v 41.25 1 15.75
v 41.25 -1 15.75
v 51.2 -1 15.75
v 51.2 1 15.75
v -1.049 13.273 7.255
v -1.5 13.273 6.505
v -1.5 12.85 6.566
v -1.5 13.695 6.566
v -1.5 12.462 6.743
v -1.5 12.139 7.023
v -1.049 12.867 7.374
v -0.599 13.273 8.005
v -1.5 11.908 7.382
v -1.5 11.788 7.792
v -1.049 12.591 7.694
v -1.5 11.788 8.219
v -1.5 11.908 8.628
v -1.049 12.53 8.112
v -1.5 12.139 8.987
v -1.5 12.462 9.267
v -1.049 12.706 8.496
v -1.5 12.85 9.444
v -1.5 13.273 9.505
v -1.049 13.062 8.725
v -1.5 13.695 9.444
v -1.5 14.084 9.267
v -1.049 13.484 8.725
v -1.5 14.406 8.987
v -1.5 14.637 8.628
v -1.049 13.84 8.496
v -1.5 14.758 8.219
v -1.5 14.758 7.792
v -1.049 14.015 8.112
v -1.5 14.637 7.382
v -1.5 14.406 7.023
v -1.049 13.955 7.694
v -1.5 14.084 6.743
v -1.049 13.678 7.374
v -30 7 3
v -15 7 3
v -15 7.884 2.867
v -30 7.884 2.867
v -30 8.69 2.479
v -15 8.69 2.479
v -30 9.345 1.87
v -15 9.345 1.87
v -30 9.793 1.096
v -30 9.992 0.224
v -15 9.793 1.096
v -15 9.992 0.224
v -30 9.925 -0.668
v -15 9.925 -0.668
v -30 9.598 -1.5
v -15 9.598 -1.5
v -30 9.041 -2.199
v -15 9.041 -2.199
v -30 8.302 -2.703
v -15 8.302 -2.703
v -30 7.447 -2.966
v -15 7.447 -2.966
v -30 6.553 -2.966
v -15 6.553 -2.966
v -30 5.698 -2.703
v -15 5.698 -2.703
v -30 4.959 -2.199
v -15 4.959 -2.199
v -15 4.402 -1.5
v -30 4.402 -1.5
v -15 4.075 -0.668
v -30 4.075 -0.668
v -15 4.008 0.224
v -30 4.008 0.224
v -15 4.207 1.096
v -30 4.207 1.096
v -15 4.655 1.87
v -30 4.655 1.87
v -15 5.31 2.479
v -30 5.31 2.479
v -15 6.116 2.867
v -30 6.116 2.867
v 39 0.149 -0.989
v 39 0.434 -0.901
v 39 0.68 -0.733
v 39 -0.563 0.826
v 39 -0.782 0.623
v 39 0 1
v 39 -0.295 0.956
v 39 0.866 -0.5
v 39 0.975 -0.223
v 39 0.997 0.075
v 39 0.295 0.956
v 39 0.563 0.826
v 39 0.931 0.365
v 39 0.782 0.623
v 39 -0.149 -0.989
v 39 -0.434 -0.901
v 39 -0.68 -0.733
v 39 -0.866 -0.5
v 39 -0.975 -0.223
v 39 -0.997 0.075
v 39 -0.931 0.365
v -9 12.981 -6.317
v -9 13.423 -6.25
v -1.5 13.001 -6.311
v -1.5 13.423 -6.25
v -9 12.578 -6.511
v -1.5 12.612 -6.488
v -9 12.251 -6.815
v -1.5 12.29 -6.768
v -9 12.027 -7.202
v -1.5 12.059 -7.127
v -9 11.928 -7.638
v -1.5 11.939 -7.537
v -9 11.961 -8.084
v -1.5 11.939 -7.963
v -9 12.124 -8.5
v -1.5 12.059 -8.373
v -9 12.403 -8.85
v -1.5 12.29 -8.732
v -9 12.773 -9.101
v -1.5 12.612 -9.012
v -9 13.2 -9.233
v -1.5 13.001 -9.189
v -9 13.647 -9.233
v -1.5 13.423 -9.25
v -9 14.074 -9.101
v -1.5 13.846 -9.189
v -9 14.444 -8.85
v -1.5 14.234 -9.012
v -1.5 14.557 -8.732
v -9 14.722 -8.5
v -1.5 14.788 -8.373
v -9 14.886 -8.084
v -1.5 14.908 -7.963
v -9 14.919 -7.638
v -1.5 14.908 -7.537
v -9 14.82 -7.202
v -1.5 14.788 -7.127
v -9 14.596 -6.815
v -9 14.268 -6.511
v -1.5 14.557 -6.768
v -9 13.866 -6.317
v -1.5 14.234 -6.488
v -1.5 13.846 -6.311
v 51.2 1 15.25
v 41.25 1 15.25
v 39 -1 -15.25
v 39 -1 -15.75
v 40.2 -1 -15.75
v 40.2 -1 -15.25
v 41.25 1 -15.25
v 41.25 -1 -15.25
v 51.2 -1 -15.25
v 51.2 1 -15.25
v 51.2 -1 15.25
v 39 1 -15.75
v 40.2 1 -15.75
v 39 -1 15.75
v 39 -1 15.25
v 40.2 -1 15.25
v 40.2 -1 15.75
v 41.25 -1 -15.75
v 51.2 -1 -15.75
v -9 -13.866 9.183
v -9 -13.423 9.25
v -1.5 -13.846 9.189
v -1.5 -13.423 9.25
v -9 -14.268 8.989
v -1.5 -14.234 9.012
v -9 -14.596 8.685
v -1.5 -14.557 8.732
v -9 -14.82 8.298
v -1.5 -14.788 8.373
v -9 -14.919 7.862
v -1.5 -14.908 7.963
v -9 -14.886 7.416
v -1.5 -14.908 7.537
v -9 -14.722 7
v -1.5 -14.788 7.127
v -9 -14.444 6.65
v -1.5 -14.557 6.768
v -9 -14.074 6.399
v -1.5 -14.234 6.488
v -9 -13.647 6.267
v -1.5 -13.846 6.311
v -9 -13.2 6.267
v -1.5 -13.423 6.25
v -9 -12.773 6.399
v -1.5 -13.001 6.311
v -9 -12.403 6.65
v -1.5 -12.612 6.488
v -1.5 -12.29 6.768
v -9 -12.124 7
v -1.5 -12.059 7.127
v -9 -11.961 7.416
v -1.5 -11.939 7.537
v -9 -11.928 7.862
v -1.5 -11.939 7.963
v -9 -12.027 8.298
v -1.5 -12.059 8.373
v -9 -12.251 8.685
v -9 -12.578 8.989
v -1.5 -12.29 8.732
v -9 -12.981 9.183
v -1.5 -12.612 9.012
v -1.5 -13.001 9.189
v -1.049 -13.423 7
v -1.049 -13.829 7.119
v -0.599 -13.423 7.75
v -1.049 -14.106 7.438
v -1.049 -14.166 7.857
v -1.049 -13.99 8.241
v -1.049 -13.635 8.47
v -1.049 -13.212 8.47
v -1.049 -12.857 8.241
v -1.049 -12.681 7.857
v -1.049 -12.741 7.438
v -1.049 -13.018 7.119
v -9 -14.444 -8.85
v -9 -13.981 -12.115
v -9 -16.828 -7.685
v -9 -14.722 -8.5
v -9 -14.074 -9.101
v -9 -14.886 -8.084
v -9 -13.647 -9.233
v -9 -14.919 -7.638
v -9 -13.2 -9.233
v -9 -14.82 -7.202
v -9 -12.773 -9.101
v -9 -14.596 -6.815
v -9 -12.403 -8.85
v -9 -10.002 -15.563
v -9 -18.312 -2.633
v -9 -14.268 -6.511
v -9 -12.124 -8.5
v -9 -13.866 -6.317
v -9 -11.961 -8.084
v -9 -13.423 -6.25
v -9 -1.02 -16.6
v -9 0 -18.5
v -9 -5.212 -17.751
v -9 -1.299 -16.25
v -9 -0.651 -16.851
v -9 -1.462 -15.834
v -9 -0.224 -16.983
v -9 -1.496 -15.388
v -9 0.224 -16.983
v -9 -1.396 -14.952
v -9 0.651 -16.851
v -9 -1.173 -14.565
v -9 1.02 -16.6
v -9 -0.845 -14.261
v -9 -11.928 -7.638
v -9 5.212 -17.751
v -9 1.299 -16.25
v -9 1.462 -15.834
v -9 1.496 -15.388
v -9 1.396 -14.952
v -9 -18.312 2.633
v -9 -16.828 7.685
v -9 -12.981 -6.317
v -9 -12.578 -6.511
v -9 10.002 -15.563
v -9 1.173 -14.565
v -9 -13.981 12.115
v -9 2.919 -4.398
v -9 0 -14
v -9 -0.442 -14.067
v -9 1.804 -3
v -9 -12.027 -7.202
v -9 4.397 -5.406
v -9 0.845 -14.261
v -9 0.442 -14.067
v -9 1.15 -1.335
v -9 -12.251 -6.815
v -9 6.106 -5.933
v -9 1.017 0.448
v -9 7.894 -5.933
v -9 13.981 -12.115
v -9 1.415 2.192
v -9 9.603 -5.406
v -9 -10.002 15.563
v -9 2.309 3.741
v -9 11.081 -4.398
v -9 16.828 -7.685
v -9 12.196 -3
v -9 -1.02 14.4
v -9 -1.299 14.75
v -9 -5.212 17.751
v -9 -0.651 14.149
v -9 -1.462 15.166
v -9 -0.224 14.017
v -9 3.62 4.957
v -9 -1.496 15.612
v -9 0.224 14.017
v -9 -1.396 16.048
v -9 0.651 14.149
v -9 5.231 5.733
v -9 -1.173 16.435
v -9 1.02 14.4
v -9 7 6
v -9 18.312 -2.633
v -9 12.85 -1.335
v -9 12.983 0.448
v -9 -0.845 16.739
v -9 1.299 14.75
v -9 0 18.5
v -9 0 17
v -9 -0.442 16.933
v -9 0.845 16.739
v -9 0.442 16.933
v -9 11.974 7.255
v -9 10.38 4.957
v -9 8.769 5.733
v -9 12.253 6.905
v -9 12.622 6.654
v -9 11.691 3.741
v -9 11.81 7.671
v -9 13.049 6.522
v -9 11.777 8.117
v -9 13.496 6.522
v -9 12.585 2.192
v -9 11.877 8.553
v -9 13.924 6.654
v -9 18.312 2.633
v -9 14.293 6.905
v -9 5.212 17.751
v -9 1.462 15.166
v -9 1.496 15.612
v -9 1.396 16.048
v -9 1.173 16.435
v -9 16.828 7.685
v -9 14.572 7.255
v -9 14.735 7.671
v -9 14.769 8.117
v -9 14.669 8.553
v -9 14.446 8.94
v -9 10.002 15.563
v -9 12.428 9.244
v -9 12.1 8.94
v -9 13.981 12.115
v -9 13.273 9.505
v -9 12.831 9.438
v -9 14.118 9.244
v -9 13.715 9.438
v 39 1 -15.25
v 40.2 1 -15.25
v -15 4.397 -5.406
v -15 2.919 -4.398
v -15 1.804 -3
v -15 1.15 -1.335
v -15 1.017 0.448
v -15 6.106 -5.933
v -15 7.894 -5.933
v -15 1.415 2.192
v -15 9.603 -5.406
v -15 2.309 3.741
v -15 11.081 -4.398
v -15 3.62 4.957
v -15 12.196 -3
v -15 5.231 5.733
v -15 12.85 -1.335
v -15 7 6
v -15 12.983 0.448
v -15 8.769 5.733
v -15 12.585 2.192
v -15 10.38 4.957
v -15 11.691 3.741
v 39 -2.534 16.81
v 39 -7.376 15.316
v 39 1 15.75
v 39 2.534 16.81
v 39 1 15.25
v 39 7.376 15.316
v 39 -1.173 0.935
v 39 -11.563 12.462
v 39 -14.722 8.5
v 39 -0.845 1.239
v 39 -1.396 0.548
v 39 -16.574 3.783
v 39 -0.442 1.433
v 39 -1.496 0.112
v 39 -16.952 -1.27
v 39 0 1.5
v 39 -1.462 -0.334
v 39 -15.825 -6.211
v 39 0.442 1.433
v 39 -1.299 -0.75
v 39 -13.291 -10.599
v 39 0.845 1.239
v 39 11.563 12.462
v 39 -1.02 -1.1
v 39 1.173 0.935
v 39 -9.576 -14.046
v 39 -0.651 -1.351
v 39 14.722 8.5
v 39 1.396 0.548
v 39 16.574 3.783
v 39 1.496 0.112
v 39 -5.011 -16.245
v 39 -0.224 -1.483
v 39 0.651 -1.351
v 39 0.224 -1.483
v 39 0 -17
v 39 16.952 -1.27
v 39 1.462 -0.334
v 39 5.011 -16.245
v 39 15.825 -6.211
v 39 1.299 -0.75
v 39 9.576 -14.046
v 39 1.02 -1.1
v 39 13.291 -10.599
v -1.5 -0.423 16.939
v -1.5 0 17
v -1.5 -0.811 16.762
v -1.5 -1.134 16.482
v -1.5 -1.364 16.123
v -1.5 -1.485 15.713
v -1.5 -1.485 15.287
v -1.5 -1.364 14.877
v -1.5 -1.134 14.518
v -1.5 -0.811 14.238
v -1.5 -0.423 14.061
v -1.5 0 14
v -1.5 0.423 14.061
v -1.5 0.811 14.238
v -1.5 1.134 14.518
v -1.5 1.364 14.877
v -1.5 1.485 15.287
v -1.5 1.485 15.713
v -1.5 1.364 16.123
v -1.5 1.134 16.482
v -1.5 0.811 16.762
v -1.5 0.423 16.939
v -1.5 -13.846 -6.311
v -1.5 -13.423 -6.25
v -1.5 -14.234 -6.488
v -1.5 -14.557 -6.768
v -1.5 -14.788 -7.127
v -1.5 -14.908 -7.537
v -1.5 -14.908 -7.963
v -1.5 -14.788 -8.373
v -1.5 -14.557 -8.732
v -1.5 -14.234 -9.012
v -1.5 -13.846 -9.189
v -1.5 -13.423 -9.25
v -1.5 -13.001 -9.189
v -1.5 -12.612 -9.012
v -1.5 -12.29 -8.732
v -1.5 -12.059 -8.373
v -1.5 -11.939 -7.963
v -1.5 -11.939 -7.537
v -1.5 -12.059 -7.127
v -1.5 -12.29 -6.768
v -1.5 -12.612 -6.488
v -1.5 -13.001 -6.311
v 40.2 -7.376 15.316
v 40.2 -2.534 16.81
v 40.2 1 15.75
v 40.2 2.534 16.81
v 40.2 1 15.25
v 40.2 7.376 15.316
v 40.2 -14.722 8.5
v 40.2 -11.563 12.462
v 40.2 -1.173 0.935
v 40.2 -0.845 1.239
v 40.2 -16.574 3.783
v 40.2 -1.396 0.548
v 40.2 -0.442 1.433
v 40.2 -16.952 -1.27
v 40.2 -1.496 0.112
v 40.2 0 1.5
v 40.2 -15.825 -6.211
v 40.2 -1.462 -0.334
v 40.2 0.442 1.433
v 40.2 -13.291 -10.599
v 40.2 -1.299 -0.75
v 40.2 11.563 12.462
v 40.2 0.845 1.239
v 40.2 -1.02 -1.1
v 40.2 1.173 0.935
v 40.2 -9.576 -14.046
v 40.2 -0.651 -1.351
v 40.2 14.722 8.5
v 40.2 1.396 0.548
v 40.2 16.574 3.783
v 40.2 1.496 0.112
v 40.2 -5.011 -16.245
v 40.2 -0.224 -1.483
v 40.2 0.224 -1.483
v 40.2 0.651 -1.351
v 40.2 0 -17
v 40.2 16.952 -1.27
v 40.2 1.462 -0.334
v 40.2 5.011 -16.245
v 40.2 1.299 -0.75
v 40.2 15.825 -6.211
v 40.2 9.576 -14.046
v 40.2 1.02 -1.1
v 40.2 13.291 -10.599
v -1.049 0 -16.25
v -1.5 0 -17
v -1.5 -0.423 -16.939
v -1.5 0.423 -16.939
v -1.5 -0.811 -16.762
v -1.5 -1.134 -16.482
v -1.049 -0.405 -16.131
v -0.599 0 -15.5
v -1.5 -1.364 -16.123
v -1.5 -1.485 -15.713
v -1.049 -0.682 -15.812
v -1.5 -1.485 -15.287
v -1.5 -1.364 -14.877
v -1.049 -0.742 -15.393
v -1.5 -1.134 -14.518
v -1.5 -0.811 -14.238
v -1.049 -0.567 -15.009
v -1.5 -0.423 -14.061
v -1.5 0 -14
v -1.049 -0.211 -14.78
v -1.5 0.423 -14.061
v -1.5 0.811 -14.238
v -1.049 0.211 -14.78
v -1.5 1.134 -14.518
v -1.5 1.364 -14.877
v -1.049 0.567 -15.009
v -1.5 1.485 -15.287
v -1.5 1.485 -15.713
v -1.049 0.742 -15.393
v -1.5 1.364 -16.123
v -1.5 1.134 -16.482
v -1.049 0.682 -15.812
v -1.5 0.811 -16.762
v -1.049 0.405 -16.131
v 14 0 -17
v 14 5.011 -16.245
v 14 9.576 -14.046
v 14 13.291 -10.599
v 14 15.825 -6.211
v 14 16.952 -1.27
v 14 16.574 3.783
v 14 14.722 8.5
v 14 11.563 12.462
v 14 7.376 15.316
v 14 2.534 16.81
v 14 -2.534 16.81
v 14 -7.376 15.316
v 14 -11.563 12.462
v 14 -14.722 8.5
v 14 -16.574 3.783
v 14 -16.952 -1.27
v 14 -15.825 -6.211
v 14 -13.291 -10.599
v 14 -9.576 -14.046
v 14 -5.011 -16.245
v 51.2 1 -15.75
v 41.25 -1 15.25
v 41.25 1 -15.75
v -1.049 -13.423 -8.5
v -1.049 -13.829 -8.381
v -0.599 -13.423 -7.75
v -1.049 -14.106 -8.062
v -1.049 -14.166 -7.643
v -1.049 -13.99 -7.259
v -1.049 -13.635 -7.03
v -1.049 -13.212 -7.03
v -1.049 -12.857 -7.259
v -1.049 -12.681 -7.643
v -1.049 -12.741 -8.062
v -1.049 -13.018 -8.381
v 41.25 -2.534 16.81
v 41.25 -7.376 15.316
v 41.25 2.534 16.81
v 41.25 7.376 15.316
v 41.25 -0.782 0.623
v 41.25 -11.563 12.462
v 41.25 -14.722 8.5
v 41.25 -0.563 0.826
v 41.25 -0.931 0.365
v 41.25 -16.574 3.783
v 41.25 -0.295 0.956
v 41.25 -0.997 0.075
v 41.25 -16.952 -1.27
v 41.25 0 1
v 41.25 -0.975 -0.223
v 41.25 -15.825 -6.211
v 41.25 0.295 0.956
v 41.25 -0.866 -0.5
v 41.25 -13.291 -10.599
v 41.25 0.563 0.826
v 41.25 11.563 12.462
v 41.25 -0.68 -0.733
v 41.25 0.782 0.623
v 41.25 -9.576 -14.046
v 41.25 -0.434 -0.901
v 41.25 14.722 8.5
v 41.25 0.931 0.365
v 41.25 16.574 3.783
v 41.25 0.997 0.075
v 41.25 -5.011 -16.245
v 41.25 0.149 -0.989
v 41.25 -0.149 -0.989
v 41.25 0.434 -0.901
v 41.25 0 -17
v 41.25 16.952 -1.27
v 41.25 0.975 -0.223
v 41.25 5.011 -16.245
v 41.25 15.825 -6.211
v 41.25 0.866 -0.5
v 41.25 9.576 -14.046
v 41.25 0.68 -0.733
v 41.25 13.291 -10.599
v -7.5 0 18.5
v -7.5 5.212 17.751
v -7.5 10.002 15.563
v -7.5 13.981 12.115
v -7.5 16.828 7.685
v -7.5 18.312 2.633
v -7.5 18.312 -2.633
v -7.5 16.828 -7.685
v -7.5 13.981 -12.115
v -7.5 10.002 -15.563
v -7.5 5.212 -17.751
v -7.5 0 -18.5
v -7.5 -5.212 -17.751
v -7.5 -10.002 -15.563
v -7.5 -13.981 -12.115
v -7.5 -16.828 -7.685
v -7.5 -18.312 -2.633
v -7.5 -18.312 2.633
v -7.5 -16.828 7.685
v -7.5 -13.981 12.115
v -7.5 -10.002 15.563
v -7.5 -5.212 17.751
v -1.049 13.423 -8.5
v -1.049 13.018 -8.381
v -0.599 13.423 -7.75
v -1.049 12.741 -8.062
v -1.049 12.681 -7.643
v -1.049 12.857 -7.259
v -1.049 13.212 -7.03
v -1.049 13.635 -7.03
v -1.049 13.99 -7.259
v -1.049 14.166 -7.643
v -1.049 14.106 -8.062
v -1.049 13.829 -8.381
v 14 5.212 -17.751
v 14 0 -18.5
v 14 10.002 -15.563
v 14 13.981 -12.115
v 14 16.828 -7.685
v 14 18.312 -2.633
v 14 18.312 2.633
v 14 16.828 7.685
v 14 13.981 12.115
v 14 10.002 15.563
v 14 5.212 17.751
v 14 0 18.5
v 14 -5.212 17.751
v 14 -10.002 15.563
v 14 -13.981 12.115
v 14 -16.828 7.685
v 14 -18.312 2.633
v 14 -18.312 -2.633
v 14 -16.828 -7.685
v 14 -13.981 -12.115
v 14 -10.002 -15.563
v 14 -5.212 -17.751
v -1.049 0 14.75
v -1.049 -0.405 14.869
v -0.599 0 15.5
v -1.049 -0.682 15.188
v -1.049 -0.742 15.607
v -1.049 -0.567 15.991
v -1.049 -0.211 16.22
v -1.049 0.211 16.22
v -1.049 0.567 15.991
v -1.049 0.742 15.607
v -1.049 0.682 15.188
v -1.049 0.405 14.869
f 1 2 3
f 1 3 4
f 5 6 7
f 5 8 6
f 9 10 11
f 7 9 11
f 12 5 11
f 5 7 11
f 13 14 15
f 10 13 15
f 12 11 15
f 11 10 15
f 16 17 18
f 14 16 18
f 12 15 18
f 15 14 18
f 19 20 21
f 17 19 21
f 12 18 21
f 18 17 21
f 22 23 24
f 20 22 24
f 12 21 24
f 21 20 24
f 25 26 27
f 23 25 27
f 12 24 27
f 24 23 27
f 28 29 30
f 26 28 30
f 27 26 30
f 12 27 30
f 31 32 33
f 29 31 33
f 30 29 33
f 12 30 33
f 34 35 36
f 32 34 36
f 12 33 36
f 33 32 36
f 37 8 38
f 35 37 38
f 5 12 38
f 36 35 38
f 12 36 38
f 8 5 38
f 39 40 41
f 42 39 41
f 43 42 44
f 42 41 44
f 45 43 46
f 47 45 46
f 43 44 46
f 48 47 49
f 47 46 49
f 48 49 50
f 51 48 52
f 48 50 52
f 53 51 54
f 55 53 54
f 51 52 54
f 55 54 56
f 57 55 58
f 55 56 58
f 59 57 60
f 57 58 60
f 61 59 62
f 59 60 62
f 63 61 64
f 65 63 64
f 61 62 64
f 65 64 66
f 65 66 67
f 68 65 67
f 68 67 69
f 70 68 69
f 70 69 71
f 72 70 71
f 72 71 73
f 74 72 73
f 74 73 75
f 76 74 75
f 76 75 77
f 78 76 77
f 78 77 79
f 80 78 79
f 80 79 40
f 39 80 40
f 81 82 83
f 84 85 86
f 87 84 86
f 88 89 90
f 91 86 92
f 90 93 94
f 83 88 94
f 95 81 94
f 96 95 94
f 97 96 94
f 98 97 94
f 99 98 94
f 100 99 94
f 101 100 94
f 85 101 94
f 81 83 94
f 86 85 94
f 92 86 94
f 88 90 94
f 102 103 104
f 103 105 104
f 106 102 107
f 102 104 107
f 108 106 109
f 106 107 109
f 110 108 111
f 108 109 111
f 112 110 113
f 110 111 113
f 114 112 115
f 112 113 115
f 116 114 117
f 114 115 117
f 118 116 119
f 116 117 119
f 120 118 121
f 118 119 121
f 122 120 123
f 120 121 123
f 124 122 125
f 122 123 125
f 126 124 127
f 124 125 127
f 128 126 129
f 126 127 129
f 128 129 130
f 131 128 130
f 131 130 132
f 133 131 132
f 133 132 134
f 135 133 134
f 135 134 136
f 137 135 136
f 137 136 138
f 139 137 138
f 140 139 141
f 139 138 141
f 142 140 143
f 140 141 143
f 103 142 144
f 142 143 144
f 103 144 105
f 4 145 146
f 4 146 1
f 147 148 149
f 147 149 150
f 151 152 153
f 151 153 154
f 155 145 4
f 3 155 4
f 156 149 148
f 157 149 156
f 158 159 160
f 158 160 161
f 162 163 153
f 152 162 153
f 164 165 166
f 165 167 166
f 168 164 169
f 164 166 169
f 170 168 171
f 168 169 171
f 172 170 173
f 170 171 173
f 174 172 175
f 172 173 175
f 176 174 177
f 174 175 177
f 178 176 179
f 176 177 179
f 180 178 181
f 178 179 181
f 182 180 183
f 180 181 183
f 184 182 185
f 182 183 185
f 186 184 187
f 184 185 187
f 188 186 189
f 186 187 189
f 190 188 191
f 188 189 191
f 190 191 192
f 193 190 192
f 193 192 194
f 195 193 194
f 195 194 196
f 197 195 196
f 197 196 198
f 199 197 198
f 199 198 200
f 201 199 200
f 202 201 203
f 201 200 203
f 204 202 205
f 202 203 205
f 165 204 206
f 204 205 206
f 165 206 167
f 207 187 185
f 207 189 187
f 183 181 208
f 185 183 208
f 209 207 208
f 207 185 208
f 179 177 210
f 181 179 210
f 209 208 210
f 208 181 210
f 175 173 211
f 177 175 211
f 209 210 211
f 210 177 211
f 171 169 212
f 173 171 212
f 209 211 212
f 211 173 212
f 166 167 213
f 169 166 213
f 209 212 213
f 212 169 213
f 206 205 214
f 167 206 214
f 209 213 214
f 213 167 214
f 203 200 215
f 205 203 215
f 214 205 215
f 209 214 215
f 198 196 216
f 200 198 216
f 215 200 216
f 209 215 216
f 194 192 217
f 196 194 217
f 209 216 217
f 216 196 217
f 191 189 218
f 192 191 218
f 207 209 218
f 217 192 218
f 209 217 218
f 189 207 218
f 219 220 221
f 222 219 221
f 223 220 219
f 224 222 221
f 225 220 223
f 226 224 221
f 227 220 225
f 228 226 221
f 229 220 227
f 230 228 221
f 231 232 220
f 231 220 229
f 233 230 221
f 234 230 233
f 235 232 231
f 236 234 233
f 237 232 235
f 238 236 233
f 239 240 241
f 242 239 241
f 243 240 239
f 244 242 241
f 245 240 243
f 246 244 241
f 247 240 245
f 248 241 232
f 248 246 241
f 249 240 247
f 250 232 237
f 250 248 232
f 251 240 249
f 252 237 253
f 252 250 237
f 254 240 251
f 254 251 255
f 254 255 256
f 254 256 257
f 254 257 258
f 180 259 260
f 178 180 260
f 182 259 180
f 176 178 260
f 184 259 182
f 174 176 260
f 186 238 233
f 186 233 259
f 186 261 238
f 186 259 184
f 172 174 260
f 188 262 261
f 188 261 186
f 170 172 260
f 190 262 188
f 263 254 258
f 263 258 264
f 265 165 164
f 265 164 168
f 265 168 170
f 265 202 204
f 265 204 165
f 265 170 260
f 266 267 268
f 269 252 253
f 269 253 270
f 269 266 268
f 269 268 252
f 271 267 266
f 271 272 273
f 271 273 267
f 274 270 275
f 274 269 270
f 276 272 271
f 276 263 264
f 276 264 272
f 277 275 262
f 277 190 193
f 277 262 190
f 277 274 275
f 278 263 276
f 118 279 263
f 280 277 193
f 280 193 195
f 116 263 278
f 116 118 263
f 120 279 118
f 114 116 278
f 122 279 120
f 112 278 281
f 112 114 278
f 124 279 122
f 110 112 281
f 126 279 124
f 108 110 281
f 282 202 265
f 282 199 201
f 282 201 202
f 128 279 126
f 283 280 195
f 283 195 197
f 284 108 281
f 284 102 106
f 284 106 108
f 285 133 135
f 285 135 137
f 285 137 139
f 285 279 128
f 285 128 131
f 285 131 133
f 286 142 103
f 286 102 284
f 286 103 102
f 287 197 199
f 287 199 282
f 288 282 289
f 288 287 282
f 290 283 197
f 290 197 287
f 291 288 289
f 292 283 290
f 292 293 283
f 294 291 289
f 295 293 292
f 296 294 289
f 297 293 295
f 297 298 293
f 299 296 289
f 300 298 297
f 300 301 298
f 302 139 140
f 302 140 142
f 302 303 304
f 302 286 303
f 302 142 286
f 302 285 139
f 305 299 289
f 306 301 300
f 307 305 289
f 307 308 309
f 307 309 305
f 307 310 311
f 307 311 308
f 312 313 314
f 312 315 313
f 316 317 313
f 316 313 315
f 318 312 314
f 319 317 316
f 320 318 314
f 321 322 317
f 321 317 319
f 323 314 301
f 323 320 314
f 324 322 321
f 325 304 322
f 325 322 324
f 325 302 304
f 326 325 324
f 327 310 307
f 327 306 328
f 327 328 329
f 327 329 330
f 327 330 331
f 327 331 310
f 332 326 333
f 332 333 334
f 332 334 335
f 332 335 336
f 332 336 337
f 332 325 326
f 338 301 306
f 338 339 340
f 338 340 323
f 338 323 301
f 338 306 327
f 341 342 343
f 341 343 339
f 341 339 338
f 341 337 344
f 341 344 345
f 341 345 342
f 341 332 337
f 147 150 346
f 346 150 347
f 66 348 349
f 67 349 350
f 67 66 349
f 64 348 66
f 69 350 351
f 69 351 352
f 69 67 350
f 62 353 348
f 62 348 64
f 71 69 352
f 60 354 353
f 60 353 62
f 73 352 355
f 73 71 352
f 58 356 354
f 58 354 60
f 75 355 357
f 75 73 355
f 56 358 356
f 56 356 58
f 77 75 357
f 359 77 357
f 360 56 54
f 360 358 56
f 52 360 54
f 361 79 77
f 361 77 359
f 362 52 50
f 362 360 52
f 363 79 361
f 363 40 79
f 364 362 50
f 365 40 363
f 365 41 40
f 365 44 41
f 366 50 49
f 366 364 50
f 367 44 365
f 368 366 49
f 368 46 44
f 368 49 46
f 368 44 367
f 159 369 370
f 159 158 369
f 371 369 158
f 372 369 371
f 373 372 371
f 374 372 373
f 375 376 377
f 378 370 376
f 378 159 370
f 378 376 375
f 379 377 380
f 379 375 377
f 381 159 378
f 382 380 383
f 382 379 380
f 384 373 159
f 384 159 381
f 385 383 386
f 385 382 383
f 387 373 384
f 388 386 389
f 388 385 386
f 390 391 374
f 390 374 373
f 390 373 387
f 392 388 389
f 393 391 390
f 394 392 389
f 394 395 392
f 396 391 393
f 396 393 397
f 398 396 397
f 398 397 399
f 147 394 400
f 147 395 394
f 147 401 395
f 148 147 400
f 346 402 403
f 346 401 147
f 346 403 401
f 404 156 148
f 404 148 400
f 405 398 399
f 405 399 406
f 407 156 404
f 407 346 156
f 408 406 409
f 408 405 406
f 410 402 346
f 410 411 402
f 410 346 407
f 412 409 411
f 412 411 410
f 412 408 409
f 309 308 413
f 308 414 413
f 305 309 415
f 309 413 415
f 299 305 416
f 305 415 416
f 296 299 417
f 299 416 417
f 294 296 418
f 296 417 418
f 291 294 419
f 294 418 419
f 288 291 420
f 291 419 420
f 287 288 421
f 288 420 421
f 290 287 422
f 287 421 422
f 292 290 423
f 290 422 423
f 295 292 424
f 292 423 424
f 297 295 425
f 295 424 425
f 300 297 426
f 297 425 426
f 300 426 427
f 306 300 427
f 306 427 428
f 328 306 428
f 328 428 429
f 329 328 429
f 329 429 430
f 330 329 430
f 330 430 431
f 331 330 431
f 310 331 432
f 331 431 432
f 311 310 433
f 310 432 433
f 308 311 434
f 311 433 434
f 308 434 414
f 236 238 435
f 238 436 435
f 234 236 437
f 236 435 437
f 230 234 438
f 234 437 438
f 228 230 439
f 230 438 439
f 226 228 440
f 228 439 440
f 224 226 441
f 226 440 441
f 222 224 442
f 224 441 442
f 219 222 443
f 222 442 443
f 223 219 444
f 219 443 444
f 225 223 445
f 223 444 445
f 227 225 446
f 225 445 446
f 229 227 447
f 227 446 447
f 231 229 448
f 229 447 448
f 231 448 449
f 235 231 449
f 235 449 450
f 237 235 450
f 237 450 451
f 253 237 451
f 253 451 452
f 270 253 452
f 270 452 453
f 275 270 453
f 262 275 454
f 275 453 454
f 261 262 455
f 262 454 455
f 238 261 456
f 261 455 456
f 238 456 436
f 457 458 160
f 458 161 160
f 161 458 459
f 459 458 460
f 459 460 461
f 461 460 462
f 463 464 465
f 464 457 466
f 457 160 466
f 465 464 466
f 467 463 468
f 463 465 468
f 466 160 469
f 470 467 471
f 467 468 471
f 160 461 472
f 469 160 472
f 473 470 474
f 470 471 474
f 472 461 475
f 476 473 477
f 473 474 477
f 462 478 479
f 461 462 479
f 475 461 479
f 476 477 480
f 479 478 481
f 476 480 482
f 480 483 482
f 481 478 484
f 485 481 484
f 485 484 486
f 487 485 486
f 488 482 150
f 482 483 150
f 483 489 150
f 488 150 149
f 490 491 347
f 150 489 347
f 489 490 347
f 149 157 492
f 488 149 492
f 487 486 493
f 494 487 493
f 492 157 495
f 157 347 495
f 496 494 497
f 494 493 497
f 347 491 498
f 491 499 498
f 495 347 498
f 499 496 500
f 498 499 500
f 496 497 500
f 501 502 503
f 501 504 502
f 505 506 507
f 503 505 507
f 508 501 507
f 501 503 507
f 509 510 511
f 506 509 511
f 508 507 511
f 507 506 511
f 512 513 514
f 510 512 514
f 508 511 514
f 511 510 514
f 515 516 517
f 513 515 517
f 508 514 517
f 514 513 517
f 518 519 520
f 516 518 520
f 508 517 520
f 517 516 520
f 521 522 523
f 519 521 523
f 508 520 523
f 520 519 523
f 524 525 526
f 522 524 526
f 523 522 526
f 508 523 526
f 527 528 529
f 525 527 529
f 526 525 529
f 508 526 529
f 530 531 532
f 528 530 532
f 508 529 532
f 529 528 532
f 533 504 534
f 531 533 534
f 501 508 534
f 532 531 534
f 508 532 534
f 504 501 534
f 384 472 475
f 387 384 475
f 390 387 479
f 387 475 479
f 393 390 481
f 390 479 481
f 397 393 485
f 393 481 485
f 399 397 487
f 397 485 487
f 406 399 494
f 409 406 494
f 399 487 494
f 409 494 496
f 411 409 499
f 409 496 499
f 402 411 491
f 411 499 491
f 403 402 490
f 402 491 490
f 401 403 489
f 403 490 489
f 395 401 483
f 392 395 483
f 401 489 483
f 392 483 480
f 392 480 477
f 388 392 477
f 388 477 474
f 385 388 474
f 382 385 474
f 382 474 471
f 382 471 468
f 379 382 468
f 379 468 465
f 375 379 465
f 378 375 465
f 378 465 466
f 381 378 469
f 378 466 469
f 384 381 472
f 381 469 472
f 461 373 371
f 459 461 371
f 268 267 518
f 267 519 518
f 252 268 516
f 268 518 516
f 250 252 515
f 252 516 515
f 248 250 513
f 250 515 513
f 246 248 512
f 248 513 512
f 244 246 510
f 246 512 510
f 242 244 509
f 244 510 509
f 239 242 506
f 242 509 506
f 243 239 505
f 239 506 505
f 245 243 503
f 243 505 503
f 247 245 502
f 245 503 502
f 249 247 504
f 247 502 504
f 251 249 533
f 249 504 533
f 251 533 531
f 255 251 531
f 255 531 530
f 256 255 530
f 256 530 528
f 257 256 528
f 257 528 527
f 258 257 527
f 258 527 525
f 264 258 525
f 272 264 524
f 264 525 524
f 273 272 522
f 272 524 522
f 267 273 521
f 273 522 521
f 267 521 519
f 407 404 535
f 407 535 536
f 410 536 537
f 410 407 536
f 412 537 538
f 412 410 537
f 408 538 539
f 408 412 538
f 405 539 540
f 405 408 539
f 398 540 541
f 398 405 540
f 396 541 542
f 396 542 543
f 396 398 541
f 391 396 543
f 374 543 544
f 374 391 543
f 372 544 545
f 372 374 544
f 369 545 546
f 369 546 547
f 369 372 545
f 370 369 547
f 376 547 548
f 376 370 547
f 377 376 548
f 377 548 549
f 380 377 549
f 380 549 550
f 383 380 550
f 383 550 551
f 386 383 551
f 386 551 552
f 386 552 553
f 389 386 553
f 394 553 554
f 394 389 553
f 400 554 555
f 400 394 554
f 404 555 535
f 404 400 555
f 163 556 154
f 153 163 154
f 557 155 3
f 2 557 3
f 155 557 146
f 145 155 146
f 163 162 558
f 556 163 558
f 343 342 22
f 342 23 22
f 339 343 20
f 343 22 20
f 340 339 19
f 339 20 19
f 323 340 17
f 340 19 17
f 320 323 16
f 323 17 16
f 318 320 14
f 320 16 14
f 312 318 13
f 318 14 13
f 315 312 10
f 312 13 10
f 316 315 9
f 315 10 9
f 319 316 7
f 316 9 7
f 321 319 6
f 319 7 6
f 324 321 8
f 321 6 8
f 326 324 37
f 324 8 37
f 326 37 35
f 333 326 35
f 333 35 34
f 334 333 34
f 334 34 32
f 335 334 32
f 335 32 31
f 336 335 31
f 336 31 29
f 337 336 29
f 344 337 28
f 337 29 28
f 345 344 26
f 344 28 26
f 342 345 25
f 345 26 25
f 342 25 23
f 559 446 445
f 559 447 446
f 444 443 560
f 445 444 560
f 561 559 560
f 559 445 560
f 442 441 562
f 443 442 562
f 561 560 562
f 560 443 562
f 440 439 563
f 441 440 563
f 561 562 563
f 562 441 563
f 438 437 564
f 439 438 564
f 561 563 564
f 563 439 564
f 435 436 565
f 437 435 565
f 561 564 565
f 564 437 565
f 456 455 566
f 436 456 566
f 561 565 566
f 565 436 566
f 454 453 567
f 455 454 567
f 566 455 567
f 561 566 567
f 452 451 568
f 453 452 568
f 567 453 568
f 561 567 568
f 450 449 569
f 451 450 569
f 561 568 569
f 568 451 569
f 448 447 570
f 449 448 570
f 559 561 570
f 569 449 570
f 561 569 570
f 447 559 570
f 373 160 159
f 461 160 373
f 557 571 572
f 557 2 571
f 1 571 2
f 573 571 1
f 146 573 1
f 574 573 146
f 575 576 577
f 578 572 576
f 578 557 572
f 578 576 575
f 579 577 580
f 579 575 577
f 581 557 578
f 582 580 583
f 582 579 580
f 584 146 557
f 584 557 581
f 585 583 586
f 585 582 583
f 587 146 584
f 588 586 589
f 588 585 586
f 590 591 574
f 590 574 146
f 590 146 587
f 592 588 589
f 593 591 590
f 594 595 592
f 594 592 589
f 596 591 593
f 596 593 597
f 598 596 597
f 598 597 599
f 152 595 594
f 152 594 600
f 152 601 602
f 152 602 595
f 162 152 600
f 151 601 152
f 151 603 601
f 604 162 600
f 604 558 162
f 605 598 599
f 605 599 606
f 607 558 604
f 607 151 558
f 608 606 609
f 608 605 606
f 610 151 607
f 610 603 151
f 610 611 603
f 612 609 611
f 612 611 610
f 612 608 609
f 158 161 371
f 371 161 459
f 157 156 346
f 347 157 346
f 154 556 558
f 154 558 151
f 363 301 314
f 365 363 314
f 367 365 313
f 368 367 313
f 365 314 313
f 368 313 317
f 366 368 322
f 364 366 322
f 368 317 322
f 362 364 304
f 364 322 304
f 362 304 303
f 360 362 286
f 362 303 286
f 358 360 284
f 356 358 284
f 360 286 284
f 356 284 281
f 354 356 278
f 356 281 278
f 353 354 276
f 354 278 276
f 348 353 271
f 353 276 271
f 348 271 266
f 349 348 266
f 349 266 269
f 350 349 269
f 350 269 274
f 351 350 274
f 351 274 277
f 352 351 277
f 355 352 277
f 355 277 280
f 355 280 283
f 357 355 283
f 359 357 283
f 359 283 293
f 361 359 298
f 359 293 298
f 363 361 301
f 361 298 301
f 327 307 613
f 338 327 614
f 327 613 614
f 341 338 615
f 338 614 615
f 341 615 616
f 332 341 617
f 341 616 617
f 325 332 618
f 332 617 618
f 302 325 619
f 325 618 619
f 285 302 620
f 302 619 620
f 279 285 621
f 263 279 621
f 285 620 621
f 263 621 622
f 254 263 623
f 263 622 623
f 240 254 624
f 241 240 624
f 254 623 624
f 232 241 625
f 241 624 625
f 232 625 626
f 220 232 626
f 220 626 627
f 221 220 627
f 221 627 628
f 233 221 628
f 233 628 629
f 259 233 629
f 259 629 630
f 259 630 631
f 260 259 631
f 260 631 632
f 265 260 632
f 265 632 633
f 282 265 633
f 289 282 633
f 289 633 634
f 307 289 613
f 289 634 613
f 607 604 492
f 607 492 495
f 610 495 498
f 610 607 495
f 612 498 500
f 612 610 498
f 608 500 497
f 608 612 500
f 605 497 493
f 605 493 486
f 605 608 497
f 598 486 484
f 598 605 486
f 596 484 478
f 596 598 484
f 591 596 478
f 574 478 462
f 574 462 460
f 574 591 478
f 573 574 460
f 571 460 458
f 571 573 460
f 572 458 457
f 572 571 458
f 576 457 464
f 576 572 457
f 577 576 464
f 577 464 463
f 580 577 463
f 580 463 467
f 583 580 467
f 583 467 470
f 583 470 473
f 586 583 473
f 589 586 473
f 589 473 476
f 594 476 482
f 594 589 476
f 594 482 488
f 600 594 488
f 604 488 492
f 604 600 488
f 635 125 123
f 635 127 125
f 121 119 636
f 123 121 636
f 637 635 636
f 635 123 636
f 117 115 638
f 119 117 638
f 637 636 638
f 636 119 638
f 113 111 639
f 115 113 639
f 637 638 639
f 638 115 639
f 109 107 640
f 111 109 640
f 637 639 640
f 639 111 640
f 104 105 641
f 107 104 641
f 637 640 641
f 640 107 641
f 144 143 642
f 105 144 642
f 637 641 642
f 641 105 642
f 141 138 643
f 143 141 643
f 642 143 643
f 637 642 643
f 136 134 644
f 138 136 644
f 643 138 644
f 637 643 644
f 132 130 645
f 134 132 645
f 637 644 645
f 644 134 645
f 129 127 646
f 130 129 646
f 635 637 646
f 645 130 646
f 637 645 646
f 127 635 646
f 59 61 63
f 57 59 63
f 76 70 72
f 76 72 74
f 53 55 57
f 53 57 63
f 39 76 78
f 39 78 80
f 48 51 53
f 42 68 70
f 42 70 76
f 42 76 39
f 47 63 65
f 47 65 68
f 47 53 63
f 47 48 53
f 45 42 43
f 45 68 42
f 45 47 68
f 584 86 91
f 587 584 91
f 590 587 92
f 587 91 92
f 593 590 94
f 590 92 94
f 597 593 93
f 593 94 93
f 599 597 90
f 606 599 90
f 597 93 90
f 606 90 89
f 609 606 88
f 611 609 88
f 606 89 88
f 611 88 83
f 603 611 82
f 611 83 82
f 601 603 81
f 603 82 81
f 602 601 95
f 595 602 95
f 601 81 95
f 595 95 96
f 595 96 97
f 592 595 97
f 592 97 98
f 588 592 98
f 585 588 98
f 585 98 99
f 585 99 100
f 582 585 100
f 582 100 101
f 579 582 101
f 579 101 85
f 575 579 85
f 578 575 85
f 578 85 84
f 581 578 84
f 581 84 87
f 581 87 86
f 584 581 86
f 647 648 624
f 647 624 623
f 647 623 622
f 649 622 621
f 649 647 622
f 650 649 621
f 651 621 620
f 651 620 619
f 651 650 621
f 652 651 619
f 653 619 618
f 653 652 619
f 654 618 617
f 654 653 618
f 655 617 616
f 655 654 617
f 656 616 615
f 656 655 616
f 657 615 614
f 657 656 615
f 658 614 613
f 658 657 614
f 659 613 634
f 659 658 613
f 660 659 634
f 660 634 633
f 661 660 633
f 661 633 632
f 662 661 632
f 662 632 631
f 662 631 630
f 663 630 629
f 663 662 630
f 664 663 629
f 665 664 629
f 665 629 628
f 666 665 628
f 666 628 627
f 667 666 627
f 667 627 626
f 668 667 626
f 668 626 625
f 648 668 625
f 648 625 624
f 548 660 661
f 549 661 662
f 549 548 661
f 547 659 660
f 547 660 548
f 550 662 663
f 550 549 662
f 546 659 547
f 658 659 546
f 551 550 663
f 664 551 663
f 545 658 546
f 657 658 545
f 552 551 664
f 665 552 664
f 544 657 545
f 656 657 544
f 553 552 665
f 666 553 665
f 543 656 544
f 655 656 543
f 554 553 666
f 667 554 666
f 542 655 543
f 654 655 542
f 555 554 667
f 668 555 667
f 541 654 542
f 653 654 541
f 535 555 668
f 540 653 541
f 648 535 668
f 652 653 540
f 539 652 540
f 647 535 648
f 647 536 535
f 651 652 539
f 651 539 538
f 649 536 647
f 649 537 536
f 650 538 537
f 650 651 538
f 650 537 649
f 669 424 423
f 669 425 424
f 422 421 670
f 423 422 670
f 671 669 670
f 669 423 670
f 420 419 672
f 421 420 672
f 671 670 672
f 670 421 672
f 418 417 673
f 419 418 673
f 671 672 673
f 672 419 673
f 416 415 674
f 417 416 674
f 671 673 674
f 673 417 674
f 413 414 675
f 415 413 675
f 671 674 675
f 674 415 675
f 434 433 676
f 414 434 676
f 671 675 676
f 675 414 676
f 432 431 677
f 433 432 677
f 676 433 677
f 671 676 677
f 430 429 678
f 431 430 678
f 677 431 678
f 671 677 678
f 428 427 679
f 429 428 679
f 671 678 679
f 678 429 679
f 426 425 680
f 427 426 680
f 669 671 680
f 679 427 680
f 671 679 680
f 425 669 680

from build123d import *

# Parameters (mm, degrees)
SKETCH1_R                      = 17
BOSS_EXTRUDE1_DEPTH            = 1.05
SKETCH2_W                      = 0.5
SKETCH2_H                      = 2
POLES_DEPTH                    = 1.2
POLES_DEPTH_BACK               = 11
SKETCH3_R                      = 1.5
BOSS_EXTRUDE3_DEPTH            = 1.2
SKETCH5_R                      = 17
BOSS_EXTRUDE5_DEPTH            = 25
SKETCH6_R                      = 18.5
REDUCTUR_DEPTH                 = 21.5
SKETCH35_R                     = 18.5
ENDPLATE_DEPTH                 = 1.5
SKETCH36_R                     = 6
BOSS_EXTRUDE25_DEPTH           = 6
F_3_1_3_1_DIAMETER_HOLE1_D     = 6
F_3_1_3_1_DIAMETER_HOLE1_DEPTH = 2.2
F_2_0_2_DIAMETER_HOLE1_D       = 2
F_2_0_2_DIAMETER_HOLE1_DEPTH   = 2.25
F_3_0MM_1_D                    = 3
F_3_0MM_1_DEPTH                = 7.5
F_3_0MM_1_TIP                  = 0.901290929
SKETCH_1_R                     = 3
EXTRUDE_1_DEPTH                = 21


with BuildPart() as part:
    # Sketch1 → Boss-Extrude1 (new body)
    with BuildSketch(Plane(origin=(41.25, 0, 0), x_dir=(0, 0, -1), z_dir=(1, 0, 0))):
        Circle(SKETCH1_R)
    extrude(amount=-BOSS_EXTRUDE1_DEPTH)

    # Sketch2 → Poles (add, two sides)
    with BuildSketch(Plane.ZY.offset(-40.2)) as poles_sk:
        with Locations((15.5, 0)):
            Rectangle(SKETCH2_W, SKETCH2_H)
        with Locations((-15.5, 0)):
            Rectangle(SKETCH2_W, SKETCH2_H)
    extrude(amount=POLES_DEPTH)
    extrude(poles_sk.sketch, amount=-POLES_DEPTH_BACK)

    # Sketch3 → Boss-Extrude3 (add)
    with BuildSketch(Plane.ZY.offset(-40.2)):
        Circle(SKETCH3_R)
    extrude(amount=BOSS_EXTRUDE3_DEPTH)

    # Sketch5 → Boss-Extrude5 (add)
    with BuildSketch(Plane(origin=(39, 0, 0), x_dir=(0, 0, -1), z_dir=(1, 0, 0))):
        Circle(SKETCH5_R)
    extrude(amount=-BOSS_EXTRUDE5_DEPTH)

    # Sketch6 → Reductur (add)
    with BuildSketch(Plane(origin=(14, 0, 0), x_dir=(0, 0, -1), z_dir=(1, 0, 0))):
        Circle(SKETCH6_R)
    extrude(amount=-REDUCTUR_DEPTH)

    # Sketch35 → Endplate (add)
    with BuildSketch(Plane.ZY.offset(7.5)):
        Circle(SKETCH35_R)
    extrude(amount=ENDPLATE_DEPTH)

    # Sketch36 → Boss-Extrude25 (add)
    with BuildSketch(Plane.ZY.offset(9)):
        with Locations((0, 7)):
            Circle(SKETCH36_R)
    extrude(amount=BOSS_EXTRUDE25_DEPTH)

    # Ø3.1 (3.1) Diameter Hole1
    with Locations(Plane.ZY.offset(15)):
        with Locations((0, 7)):
            Hole(F_3_1_3_1_DIAMETER_HOLE1_D / 2, depth=F_3_1_3_1_DIAMETER_HOLE1_DEPTH)

    # Ø2.0 (2) Diameter Hole1
    with Locations(Plane(origin=(41.25, 0, 0), x_dir=(0, 0, -1), z_dir=(1, 0, 0))):
        with Locations((0, 0)):
            Hole(F_2_0_2_DIAMETER_HOLE1_D / 2, depth=F_2_0_2_DIAMETER_HOLE1_DEPTH)

    # Ø3.0mm 定位孔1
    with Locations(Plane(origin=(-9, 0, -15.5), x_dir=(0, 0, -1), z_dir=(-1, 0, 0))):
        with Locations((0, 0), (-7.75, -13.423393759), (-23.50507477, -13.272858695), (-31, 0), (-23.25, 13.423393759), (-7.75, 13.423393759)):
            Hole(F_3_0MM_1_D / 2, depth=F_3_0MM_1_DEPTH)
            with Locations((0, 0, -(F_3_0MM_1_DEPTH + F_3_0MM_1_TIP / 2))):  # 118° drill point
                Cone(0, F_3_0MM_1_D / 2, F_3_0MM_1_TIP, mode=Mode.SUBTRACT)

    # 草圖1 → 填料-伸長1 (add)
    with BuildSketch(Plane.ZY.offset(9)):
        with Locations((0, 7)):
            Circle(SKETCH_1_R)
    extrude(amount=EXTRUDE_1_DEPTH)


solid = part.part
